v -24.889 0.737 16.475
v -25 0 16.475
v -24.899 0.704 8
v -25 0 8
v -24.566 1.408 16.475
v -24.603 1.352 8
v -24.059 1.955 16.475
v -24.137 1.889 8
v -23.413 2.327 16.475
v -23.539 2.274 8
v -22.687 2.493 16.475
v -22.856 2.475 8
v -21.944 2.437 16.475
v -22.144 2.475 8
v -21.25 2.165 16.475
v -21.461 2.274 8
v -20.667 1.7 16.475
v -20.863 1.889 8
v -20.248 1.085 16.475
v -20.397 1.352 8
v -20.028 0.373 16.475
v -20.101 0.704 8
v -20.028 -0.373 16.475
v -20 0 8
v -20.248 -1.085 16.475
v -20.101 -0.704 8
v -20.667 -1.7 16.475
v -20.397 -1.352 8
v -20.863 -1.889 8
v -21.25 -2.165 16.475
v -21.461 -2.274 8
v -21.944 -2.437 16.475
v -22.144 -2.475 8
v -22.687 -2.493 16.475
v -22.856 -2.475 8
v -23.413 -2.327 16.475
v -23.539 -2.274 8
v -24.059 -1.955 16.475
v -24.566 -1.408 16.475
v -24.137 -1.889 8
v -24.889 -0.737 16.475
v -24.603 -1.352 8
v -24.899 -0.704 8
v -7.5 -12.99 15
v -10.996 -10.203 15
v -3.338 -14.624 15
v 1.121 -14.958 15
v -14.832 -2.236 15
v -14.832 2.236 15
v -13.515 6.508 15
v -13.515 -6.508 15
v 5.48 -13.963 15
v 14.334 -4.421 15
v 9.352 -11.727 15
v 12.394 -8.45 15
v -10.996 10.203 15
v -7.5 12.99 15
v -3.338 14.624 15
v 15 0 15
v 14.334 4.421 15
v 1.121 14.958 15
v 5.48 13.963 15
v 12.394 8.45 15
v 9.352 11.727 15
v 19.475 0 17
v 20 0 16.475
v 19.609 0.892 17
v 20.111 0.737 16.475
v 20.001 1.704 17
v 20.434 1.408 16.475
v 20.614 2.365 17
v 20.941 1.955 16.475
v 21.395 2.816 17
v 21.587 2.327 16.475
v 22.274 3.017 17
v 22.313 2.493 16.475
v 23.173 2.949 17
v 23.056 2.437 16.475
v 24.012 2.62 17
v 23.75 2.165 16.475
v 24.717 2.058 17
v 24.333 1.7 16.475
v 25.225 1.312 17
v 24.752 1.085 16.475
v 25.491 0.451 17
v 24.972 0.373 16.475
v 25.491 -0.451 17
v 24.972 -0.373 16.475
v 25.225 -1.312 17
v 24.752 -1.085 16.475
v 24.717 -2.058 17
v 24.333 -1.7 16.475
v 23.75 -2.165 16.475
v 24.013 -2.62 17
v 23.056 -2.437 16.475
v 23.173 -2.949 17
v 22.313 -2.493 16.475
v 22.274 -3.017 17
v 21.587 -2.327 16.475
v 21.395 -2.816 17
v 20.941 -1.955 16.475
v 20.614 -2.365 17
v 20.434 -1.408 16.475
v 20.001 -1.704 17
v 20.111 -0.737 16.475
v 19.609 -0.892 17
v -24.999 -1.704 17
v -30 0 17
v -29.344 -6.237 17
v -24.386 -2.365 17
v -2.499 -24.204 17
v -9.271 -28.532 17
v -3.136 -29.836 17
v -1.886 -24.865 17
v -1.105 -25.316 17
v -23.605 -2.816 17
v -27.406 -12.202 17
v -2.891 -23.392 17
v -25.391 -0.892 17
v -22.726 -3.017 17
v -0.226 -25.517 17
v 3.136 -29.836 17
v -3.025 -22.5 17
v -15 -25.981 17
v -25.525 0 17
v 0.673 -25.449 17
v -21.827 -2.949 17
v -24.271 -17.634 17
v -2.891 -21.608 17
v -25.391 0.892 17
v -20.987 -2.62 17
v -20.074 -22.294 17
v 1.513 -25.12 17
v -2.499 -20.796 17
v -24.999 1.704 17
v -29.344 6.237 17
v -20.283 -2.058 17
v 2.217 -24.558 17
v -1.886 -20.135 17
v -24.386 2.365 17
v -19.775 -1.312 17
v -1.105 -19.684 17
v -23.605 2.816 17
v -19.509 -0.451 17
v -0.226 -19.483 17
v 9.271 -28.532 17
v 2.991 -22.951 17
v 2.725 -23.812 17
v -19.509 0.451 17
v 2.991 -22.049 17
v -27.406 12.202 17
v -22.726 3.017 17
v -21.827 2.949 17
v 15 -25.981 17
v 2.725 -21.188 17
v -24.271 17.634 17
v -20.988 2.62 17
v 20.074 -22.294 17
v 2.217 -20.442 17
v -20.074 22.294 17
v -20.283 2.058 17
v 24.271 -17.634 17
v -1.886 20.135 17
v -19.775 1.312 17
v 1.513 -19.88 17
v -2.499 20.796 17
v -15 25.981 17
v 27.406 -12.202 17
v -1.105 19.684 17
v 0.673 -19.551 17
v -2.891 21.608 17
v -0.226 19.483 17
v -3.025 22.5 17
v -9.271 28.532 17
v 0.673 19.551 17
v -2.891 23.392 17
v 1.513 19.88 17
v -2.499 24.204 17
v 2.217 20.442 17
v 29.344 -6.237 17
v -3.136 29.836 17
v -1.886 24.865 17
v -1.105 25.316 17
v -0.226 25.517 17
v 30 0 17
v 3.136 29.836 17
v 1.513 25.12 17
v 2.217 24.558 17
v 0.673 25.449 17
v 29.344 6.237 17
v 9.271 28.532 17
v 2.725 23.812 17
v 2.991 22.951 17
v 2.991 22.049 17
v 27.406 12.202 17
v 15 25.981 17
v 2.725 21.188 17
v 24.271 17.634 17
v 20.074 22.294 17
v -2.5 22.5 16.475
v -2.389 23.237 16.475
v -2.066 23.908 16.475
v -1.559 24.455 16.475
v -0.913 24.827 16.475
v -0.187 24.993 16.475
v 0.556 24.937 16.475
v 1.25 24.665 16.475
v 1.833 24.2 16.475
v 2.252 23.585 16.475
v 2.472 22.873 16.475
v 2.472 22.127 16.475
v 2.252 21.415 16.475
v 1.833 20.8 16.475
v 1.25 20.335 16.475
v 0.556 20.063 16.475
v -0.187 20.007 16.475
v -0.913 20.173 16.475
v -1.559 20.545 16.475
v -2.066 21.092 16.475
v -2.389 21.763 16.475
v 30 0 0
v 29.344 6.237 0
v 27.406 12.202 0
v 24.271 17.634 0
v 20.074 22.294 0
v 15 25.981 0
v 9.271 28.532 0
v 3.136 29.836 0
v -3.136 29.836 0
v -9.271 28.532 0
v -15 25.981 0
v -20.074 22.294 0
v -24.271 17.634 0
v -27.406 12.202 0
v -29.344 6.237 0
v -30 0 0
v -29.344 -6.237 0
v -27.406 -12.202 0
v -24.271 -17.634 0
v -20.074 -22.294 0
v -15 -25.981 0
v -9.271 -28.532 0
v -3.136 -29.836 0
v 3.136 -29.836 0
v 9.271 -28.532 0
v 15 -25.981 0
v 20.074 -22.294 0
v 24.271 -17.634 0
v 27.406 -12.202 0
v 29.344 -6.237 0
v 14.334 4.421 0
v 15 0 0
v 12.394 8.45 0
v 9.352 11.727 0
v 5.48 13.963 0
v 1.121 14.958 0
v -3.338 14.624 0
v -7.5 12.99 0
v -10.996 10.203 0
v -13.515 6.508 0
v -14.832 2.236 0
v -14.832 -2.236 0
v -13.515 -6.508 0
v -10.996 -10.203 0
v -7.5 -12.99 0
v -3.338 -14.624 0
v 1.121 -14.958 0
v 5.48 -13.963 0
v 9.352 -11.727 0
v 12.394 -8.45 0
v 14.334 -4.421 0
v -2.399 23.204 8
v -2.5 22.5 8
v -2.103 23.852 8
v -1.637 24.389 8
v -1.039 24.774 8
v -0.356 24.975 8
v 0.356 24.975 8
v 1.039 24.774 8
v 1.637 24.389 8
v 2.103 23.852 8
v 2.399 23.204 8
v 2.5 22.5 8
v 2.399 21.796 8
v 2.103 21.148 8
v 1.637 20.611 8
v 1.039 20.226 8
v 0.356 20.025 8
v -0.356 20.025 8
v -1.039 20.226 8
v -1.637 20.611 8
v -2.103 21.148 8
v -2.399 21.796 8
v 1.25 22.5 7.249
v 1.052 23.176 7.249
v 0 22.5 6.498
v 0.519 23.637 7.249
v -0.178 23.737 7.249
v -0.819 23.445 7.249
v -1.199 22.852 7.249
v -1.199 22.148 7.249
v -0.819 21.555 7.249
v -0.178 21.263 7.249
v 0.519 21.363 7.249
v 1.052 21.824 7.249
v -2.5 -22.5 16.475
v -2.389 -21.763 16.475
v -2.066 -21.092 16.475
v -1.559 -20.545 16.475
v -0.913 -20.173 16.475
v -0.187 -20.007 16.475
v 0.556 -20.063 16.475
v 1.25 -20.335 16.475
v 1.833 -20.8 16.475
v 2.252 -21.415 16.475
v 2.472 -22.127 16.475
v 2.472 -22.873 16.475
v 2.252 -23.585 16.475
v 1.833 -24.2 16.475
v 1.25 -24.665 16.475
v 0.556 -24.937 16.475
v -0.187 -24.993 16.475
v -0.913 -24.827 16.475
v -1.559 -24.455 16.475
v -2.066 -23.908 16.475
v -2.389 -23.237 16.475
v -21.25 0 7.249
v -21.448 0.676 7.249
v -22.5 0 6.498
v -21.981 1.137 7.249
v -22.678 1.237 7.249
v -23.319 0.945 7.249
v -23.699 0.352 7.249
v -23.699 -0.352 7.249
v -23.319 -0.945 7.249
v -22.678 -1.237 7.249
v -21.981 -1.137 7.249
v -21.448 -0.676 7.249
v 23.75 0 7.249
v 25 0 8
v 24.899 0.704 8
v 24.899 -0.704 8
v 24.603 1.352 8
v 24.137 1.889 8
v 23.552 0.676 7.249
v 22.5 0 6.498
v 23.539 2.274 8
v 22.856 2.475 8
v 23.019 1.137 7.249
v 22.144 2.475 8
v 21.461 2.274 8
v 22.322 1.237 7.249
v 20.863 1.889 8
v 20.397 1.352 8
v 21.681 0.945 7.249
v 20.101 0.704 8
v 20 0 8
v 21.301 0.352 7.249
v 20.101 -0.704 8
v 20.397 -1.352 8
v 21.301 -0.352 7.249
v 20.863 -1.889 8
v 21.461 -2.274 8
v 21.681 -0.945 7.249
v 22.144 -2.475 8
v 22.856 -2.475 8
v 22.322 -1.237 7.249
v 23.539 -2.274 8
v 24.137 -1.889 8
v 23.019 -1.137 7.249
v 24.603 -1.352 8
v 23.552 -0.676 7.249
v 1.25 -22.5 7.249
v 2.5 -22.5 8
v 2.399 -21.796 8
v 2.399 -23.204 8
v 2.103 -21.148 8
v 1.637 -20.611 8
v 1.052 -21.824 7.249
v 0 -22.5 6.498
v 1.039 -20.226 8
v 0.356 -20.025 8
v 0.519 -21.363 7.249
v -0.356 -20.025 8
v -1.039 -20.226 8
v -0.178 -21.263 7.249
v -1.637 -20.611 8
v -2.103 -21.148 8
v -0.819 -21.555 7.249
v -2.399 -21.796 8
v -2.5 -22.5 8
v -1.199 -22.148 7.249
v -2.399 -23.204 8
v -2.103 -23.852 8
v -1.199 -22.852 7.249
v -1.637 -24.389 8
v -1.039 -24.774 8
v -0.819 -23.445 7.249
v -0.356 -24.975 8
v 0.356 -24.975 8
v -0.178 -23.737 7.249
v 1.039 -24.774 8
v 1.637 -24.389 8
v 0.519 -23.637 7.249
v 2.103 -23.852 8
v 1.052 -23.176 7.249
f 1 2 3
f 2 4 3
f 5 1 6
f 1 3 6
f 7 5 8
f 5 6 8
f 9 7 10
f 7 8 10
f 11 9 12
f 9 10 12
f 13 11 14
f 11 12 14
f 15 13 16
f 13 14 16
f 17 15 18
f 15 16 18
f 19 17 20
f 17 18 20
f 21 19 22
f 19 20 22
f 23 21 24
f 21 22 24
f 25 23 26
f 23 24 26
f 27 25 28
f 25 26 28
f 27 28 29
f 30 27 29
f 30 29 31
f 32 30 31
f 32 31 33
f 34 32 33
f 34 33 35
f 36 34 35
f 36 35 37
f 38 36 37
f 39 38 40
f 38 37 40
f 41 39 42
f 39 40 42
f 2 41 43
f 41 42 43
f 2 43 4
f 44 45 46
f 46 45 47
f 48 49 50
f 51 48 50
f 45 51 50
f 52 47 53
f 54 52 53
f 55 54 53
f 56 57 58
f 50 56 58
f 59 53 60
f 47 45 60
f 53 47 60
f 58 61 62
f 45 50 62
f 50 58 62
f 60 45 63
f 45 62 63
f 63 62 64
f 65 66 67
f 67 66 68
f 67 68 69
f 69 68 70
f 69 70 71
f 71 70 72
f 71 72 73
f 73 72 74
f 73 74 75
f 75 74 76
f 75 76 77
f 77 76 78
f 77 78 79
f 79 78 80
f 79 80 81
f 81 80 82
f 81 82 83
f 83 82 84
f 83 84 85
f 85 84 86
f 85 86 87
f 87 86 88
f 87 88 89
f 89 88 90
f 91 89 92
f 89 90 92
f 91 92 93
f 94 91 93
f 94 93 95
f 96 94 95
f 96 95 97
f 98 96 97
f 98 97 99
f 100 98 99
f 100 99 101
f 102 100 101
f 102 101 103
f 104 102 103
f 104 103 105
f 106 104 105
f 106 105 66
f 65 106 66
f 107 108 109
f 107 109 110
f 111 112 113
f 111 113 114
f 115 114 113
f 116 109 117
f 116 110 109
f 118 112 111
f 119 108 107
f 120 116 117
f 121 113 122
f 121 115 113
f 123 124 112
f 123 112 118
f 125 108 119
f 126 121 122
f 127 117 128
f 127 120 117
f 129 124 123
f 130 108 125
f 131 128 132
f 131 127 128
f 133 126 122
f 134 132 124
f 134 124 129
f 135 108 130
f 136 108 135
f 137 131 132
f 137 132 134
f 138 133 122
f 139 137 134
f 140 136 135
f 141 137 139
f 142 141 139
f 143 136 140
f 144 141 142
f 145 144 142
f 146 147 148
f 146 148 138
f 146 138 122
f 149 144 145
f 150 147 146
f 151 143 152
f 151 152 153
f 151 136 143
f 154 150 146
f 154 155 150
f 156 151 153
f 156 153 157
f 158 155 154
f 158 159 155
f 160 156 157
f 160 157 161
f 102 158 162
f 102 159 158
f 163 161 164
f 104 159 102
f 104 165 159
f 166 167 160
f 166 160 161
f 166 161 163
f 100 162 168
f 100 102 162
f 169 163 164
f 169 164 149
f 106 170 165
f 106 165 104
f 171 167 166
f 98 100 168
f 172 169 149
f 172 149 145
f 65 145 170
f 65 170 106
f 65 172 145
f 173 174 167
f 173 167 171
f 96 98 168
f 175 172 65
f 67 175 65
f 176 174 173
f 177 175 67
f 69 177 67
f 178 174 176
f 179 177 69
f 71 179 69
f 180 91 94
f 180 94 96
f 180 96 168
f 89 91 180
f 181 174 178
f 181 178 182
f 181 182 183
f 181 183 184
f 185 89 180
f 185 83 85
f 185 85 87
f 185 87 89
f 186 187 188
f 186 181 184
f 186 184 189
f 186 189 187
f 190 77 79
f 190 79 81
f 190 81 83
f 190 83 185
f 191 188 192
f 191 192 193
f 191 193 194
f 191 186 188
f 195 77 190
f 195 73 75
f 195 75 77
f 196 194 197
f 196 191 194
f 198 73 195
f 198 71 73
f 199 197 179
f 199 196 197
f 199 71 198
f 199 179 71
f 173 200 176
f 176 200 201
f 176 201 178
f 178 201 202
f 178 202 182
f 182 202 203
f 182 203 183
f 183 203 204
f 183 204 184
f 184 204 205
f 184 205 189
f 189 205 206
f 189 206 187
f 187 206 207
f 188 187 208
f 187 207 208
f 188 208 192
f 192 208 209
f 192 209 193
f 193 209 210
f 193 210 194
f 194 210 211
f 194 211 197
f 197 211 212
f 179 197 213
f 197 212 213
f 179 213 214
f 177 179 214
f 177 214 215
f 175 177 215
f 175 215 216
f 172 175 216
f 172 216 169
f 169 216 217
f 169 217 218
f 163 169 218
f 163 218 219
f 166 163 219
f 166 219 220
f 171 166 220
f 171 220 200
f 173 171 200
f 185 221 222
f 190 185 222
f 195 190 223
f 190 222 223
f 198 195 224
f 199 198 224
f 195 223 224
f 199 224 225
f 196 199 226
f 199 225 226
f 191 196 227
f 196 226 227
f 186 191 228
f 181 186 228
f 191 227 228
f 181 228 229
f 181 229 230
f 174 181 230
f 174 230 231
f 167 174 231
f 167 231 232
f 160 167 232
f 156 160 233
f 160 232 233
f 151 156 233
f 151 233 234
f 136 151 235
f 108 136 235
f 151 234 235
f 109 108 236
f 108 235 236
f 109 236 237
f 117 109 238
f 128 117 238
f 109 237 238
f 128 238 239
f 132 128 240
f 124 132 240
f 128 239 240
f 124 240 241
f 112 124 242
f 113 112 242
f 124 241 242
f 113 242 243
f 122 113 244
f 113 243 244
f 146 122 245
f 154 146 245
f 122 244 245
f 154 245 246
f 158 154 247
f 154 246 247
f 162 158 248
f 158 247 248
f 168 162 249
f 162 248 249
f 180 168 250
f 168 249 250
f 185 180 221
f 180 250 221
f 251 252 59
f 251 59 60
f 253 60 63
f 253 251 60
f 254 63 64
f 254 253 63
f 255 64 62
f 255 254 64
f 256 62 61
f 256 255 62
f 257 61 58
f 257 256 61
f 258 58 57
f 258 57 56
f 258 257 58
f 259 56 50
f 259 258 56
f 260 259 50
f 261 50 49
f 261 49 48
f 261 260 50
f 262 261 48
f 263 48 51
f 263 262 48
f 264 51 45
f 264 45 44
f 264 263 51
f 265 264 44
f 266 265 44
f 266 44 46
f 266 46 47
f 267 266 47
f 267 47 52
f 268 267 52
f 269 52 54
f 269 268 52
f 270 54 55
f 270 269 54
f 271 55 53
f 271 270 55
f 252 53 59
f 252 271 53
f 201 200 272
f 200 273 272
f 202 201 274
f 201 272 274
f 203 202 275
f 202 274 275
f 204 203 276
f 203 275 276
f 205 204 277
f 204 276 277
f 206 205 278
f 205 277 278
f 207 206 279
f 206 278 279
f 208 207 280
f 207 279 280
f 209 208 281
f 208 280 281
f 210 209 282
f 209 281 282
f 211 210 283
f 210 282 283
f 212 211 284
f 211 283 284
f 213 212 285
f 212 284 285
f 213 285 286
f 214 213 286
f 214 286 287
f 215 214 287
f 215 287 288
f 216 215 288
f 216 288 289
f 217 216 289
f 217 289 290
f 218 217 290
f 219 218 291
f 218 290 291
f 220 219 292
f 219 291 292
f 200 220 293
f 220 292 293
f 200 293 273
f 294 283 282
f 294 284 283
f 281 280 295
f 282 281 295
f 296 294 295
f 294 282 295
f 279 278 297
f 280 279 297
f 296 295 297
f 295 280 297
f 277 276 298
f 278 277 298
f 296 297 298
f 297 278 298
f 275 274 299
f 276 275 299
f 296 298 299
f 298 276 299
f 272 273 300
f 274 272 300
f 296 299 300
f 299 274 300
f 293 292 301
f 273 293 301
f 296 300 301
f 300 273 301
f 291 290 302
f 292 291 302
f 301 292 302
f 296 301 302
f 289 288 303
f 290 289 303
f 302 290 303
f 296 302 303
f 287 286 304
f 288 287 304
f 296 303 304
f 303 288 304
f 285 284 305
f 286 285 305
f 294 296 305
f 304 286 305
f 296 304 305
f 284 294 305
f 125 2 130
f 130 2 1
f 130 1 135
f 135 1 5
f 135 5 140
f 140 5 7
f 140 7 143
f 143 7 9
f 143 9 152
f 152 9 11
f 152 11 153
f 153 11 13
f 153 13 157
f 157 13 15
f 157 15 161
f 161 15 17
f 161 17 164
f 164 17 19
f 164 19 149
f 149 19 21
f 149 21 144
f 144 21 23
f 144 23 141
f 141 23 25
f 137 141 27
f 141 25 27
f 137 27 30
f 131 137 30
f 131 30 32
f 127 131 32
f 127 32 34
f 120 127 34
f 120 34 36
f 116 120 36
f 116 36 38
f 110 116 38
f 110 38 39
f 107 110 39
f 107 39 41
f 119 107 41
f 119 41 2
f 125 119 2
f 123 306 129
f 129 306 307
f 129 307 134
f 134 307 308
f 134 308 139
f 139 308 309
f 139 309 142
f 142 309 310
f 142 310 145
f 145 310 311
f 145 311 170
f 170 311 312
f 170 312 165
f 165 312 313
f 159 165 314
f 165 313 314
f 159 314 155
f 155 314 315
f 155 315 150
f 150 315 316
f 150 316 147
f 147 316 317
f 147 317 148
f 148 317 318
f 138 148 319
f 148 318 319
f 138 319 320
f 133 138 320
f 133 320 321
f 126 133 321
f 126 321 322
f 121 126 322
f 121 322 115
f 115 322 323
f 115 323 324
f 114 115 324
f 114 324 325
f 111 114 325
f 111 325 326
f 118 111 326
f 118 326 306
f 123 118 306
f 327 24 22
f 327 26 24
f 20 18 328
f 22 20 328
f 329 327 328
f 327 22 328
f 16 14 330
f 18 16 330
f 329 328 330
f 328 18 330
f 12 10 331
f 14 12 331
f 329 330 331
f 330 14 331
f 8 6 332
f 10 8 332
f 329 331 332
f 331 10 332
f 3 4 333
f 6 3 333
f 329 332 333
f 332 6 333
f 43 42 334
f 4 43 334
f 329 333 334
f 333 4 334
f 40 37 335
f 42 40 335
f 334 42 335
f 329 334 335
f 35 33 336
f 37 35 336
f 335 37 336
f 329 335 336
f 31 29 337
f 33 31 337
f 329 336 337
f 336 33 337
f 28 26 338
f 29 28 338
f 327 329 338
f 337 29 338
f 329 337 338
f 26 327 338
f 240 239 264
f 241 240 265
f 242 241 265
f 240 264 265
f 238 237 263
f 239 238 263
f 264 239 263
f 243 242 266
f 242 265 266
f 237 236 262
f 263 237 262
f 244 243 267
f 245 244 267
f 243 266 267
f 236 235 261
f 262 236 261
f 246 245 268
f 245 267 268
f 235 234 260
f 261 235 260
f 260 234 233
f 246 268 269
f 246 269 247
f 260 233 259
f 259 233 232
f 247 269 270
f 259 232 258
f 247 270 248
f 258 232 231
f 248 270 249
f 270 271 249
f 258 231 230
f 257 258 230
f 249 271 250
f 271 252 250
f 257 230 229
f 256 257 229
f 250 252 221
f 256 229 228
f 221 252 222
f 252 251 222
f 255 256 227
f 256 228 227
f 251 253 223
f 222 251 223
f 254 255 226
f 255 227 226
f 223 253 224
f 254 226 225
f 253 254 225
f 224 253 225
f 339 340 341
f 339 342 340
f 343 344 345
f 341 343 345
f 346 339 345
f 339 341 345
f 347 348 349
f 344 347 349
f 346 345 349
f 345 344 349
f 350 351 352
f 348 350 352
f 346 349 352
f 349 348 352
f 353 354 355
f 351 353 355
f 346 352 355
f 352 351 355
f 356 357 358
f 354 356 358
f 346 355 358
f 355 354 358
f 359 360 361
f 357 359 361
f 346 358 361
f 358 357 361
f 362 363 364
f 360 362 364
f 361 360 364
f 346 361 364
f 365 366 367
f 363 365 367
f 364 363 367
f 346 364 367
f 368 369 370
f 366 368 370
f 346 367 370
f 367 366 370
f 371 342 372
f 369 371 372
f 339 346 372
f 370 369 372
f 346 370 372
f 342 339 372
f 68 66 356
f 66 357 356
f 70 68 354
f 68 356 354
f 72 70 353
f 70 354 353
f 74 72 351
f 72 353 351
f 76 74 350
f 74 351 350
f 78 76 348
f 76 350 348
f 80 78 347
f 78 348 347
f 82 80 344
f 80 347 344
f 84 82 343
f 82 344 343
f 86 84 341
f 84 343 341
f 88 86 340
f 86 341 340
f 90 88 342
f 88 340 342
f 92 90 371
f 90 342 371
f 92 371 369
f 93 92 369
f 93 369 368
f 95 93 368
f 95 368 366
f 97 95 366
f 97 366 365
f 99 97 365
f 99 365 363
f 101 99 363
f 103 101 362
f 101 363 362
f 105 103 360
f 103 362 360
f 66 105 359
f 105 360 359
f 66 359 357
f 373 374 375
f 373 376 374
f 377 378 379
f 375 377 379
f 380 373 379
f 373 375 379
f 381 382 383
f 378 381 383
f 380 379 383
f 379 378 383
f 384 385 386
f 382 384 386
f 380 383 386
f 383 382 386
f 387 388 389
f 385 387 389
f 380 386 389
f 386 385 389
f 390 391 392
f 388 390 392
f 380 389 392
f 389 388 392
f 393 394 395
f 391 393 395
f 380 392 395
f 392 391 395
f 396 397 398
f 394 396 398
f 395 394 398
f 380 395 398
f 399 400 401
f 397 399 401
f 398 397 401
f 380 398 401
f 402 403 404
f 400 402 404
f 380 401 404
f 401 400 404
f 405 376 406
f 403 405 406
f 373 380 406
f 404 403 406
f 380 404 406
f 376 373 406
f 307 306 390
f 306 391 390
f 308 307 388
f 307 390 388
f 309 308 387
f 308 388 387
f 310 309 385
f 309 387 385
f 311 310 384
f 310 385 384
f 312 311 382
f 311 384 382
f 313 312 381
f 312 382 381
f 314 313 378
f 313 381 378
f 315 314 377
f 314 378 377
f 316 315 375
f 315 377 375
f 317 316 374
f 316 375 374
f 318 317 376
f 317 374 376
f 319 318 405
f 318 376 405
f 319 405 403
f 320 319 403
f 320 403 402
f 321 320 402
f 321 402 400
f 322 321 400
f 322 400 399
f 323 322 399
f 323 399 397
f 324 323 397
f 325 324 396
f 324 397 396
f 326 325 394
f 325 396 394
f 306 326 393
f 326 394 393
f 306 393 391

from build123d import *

# Parameters (mm, degrees)
SKETCH1_R                   = 30
BOSS_EXTRUDE1_DEPTH         = 17
SKETCH1_3_R                 = 15
CUT_EXTRUDE1_DEPTH          = 15
M6_TAPPED_HOLE1_D           = 5
M6_TAPPED_HOLE1_DEPTH       = 9
M6_TAPPED_HOLE1_CSINK_D     = 6.05
M6_TAPPED_HOLE1_CSINK_ANGLE = 90
M6_TAPPED_HOLE1_TIP         = 1.502151548


with BuildPart() as part:
    # Sketch1 → Boss-Extrude1 (new body)
    with BuildSketch(Plane.XY):
        Circle(SKETCH1_R)
    extrude(amount=BOSS_EXTRUDE1_DEPTH)

    # Sketch1<3> → Cut-Extrude1 (cut)
    with BuildSketch(Plane.XY):
        Circle(SKETCH1_3_R)
    extrude(amount=CUT_EXTRUDE1_DEPTH, mode=Mode.SUBTRACT)

    # M6 Tapped Hole1
    with Locations(Plane.XY.offset(17)):
        with Locations((0, -22.5), (22.5, 0), (0, 22.5), (-22.5, 0)):
            CounterSinkHole(M6_TAPPED_HOLE1_D / 2, M6_TAPPED_HOLE1_CSINK_D / 2, depth=M6_TAPPED_HOLE1_DEPTH, counter_sink_angle=M6_TAPPED_HOLE1_CSINK_ANGLE)
            with Locations((0, 0, -(M6_TAPPED_HOLE1_DEPTH + M6_TAPPED_HOLE1_TIP / 2))):  # 118° drill point
                Cone(0, M6_TAPPED_HOLE1_D / 2, M6_TAPPED_HOLE1_TIP, mode=Mode.SUBTRACT)


solid = part.part
